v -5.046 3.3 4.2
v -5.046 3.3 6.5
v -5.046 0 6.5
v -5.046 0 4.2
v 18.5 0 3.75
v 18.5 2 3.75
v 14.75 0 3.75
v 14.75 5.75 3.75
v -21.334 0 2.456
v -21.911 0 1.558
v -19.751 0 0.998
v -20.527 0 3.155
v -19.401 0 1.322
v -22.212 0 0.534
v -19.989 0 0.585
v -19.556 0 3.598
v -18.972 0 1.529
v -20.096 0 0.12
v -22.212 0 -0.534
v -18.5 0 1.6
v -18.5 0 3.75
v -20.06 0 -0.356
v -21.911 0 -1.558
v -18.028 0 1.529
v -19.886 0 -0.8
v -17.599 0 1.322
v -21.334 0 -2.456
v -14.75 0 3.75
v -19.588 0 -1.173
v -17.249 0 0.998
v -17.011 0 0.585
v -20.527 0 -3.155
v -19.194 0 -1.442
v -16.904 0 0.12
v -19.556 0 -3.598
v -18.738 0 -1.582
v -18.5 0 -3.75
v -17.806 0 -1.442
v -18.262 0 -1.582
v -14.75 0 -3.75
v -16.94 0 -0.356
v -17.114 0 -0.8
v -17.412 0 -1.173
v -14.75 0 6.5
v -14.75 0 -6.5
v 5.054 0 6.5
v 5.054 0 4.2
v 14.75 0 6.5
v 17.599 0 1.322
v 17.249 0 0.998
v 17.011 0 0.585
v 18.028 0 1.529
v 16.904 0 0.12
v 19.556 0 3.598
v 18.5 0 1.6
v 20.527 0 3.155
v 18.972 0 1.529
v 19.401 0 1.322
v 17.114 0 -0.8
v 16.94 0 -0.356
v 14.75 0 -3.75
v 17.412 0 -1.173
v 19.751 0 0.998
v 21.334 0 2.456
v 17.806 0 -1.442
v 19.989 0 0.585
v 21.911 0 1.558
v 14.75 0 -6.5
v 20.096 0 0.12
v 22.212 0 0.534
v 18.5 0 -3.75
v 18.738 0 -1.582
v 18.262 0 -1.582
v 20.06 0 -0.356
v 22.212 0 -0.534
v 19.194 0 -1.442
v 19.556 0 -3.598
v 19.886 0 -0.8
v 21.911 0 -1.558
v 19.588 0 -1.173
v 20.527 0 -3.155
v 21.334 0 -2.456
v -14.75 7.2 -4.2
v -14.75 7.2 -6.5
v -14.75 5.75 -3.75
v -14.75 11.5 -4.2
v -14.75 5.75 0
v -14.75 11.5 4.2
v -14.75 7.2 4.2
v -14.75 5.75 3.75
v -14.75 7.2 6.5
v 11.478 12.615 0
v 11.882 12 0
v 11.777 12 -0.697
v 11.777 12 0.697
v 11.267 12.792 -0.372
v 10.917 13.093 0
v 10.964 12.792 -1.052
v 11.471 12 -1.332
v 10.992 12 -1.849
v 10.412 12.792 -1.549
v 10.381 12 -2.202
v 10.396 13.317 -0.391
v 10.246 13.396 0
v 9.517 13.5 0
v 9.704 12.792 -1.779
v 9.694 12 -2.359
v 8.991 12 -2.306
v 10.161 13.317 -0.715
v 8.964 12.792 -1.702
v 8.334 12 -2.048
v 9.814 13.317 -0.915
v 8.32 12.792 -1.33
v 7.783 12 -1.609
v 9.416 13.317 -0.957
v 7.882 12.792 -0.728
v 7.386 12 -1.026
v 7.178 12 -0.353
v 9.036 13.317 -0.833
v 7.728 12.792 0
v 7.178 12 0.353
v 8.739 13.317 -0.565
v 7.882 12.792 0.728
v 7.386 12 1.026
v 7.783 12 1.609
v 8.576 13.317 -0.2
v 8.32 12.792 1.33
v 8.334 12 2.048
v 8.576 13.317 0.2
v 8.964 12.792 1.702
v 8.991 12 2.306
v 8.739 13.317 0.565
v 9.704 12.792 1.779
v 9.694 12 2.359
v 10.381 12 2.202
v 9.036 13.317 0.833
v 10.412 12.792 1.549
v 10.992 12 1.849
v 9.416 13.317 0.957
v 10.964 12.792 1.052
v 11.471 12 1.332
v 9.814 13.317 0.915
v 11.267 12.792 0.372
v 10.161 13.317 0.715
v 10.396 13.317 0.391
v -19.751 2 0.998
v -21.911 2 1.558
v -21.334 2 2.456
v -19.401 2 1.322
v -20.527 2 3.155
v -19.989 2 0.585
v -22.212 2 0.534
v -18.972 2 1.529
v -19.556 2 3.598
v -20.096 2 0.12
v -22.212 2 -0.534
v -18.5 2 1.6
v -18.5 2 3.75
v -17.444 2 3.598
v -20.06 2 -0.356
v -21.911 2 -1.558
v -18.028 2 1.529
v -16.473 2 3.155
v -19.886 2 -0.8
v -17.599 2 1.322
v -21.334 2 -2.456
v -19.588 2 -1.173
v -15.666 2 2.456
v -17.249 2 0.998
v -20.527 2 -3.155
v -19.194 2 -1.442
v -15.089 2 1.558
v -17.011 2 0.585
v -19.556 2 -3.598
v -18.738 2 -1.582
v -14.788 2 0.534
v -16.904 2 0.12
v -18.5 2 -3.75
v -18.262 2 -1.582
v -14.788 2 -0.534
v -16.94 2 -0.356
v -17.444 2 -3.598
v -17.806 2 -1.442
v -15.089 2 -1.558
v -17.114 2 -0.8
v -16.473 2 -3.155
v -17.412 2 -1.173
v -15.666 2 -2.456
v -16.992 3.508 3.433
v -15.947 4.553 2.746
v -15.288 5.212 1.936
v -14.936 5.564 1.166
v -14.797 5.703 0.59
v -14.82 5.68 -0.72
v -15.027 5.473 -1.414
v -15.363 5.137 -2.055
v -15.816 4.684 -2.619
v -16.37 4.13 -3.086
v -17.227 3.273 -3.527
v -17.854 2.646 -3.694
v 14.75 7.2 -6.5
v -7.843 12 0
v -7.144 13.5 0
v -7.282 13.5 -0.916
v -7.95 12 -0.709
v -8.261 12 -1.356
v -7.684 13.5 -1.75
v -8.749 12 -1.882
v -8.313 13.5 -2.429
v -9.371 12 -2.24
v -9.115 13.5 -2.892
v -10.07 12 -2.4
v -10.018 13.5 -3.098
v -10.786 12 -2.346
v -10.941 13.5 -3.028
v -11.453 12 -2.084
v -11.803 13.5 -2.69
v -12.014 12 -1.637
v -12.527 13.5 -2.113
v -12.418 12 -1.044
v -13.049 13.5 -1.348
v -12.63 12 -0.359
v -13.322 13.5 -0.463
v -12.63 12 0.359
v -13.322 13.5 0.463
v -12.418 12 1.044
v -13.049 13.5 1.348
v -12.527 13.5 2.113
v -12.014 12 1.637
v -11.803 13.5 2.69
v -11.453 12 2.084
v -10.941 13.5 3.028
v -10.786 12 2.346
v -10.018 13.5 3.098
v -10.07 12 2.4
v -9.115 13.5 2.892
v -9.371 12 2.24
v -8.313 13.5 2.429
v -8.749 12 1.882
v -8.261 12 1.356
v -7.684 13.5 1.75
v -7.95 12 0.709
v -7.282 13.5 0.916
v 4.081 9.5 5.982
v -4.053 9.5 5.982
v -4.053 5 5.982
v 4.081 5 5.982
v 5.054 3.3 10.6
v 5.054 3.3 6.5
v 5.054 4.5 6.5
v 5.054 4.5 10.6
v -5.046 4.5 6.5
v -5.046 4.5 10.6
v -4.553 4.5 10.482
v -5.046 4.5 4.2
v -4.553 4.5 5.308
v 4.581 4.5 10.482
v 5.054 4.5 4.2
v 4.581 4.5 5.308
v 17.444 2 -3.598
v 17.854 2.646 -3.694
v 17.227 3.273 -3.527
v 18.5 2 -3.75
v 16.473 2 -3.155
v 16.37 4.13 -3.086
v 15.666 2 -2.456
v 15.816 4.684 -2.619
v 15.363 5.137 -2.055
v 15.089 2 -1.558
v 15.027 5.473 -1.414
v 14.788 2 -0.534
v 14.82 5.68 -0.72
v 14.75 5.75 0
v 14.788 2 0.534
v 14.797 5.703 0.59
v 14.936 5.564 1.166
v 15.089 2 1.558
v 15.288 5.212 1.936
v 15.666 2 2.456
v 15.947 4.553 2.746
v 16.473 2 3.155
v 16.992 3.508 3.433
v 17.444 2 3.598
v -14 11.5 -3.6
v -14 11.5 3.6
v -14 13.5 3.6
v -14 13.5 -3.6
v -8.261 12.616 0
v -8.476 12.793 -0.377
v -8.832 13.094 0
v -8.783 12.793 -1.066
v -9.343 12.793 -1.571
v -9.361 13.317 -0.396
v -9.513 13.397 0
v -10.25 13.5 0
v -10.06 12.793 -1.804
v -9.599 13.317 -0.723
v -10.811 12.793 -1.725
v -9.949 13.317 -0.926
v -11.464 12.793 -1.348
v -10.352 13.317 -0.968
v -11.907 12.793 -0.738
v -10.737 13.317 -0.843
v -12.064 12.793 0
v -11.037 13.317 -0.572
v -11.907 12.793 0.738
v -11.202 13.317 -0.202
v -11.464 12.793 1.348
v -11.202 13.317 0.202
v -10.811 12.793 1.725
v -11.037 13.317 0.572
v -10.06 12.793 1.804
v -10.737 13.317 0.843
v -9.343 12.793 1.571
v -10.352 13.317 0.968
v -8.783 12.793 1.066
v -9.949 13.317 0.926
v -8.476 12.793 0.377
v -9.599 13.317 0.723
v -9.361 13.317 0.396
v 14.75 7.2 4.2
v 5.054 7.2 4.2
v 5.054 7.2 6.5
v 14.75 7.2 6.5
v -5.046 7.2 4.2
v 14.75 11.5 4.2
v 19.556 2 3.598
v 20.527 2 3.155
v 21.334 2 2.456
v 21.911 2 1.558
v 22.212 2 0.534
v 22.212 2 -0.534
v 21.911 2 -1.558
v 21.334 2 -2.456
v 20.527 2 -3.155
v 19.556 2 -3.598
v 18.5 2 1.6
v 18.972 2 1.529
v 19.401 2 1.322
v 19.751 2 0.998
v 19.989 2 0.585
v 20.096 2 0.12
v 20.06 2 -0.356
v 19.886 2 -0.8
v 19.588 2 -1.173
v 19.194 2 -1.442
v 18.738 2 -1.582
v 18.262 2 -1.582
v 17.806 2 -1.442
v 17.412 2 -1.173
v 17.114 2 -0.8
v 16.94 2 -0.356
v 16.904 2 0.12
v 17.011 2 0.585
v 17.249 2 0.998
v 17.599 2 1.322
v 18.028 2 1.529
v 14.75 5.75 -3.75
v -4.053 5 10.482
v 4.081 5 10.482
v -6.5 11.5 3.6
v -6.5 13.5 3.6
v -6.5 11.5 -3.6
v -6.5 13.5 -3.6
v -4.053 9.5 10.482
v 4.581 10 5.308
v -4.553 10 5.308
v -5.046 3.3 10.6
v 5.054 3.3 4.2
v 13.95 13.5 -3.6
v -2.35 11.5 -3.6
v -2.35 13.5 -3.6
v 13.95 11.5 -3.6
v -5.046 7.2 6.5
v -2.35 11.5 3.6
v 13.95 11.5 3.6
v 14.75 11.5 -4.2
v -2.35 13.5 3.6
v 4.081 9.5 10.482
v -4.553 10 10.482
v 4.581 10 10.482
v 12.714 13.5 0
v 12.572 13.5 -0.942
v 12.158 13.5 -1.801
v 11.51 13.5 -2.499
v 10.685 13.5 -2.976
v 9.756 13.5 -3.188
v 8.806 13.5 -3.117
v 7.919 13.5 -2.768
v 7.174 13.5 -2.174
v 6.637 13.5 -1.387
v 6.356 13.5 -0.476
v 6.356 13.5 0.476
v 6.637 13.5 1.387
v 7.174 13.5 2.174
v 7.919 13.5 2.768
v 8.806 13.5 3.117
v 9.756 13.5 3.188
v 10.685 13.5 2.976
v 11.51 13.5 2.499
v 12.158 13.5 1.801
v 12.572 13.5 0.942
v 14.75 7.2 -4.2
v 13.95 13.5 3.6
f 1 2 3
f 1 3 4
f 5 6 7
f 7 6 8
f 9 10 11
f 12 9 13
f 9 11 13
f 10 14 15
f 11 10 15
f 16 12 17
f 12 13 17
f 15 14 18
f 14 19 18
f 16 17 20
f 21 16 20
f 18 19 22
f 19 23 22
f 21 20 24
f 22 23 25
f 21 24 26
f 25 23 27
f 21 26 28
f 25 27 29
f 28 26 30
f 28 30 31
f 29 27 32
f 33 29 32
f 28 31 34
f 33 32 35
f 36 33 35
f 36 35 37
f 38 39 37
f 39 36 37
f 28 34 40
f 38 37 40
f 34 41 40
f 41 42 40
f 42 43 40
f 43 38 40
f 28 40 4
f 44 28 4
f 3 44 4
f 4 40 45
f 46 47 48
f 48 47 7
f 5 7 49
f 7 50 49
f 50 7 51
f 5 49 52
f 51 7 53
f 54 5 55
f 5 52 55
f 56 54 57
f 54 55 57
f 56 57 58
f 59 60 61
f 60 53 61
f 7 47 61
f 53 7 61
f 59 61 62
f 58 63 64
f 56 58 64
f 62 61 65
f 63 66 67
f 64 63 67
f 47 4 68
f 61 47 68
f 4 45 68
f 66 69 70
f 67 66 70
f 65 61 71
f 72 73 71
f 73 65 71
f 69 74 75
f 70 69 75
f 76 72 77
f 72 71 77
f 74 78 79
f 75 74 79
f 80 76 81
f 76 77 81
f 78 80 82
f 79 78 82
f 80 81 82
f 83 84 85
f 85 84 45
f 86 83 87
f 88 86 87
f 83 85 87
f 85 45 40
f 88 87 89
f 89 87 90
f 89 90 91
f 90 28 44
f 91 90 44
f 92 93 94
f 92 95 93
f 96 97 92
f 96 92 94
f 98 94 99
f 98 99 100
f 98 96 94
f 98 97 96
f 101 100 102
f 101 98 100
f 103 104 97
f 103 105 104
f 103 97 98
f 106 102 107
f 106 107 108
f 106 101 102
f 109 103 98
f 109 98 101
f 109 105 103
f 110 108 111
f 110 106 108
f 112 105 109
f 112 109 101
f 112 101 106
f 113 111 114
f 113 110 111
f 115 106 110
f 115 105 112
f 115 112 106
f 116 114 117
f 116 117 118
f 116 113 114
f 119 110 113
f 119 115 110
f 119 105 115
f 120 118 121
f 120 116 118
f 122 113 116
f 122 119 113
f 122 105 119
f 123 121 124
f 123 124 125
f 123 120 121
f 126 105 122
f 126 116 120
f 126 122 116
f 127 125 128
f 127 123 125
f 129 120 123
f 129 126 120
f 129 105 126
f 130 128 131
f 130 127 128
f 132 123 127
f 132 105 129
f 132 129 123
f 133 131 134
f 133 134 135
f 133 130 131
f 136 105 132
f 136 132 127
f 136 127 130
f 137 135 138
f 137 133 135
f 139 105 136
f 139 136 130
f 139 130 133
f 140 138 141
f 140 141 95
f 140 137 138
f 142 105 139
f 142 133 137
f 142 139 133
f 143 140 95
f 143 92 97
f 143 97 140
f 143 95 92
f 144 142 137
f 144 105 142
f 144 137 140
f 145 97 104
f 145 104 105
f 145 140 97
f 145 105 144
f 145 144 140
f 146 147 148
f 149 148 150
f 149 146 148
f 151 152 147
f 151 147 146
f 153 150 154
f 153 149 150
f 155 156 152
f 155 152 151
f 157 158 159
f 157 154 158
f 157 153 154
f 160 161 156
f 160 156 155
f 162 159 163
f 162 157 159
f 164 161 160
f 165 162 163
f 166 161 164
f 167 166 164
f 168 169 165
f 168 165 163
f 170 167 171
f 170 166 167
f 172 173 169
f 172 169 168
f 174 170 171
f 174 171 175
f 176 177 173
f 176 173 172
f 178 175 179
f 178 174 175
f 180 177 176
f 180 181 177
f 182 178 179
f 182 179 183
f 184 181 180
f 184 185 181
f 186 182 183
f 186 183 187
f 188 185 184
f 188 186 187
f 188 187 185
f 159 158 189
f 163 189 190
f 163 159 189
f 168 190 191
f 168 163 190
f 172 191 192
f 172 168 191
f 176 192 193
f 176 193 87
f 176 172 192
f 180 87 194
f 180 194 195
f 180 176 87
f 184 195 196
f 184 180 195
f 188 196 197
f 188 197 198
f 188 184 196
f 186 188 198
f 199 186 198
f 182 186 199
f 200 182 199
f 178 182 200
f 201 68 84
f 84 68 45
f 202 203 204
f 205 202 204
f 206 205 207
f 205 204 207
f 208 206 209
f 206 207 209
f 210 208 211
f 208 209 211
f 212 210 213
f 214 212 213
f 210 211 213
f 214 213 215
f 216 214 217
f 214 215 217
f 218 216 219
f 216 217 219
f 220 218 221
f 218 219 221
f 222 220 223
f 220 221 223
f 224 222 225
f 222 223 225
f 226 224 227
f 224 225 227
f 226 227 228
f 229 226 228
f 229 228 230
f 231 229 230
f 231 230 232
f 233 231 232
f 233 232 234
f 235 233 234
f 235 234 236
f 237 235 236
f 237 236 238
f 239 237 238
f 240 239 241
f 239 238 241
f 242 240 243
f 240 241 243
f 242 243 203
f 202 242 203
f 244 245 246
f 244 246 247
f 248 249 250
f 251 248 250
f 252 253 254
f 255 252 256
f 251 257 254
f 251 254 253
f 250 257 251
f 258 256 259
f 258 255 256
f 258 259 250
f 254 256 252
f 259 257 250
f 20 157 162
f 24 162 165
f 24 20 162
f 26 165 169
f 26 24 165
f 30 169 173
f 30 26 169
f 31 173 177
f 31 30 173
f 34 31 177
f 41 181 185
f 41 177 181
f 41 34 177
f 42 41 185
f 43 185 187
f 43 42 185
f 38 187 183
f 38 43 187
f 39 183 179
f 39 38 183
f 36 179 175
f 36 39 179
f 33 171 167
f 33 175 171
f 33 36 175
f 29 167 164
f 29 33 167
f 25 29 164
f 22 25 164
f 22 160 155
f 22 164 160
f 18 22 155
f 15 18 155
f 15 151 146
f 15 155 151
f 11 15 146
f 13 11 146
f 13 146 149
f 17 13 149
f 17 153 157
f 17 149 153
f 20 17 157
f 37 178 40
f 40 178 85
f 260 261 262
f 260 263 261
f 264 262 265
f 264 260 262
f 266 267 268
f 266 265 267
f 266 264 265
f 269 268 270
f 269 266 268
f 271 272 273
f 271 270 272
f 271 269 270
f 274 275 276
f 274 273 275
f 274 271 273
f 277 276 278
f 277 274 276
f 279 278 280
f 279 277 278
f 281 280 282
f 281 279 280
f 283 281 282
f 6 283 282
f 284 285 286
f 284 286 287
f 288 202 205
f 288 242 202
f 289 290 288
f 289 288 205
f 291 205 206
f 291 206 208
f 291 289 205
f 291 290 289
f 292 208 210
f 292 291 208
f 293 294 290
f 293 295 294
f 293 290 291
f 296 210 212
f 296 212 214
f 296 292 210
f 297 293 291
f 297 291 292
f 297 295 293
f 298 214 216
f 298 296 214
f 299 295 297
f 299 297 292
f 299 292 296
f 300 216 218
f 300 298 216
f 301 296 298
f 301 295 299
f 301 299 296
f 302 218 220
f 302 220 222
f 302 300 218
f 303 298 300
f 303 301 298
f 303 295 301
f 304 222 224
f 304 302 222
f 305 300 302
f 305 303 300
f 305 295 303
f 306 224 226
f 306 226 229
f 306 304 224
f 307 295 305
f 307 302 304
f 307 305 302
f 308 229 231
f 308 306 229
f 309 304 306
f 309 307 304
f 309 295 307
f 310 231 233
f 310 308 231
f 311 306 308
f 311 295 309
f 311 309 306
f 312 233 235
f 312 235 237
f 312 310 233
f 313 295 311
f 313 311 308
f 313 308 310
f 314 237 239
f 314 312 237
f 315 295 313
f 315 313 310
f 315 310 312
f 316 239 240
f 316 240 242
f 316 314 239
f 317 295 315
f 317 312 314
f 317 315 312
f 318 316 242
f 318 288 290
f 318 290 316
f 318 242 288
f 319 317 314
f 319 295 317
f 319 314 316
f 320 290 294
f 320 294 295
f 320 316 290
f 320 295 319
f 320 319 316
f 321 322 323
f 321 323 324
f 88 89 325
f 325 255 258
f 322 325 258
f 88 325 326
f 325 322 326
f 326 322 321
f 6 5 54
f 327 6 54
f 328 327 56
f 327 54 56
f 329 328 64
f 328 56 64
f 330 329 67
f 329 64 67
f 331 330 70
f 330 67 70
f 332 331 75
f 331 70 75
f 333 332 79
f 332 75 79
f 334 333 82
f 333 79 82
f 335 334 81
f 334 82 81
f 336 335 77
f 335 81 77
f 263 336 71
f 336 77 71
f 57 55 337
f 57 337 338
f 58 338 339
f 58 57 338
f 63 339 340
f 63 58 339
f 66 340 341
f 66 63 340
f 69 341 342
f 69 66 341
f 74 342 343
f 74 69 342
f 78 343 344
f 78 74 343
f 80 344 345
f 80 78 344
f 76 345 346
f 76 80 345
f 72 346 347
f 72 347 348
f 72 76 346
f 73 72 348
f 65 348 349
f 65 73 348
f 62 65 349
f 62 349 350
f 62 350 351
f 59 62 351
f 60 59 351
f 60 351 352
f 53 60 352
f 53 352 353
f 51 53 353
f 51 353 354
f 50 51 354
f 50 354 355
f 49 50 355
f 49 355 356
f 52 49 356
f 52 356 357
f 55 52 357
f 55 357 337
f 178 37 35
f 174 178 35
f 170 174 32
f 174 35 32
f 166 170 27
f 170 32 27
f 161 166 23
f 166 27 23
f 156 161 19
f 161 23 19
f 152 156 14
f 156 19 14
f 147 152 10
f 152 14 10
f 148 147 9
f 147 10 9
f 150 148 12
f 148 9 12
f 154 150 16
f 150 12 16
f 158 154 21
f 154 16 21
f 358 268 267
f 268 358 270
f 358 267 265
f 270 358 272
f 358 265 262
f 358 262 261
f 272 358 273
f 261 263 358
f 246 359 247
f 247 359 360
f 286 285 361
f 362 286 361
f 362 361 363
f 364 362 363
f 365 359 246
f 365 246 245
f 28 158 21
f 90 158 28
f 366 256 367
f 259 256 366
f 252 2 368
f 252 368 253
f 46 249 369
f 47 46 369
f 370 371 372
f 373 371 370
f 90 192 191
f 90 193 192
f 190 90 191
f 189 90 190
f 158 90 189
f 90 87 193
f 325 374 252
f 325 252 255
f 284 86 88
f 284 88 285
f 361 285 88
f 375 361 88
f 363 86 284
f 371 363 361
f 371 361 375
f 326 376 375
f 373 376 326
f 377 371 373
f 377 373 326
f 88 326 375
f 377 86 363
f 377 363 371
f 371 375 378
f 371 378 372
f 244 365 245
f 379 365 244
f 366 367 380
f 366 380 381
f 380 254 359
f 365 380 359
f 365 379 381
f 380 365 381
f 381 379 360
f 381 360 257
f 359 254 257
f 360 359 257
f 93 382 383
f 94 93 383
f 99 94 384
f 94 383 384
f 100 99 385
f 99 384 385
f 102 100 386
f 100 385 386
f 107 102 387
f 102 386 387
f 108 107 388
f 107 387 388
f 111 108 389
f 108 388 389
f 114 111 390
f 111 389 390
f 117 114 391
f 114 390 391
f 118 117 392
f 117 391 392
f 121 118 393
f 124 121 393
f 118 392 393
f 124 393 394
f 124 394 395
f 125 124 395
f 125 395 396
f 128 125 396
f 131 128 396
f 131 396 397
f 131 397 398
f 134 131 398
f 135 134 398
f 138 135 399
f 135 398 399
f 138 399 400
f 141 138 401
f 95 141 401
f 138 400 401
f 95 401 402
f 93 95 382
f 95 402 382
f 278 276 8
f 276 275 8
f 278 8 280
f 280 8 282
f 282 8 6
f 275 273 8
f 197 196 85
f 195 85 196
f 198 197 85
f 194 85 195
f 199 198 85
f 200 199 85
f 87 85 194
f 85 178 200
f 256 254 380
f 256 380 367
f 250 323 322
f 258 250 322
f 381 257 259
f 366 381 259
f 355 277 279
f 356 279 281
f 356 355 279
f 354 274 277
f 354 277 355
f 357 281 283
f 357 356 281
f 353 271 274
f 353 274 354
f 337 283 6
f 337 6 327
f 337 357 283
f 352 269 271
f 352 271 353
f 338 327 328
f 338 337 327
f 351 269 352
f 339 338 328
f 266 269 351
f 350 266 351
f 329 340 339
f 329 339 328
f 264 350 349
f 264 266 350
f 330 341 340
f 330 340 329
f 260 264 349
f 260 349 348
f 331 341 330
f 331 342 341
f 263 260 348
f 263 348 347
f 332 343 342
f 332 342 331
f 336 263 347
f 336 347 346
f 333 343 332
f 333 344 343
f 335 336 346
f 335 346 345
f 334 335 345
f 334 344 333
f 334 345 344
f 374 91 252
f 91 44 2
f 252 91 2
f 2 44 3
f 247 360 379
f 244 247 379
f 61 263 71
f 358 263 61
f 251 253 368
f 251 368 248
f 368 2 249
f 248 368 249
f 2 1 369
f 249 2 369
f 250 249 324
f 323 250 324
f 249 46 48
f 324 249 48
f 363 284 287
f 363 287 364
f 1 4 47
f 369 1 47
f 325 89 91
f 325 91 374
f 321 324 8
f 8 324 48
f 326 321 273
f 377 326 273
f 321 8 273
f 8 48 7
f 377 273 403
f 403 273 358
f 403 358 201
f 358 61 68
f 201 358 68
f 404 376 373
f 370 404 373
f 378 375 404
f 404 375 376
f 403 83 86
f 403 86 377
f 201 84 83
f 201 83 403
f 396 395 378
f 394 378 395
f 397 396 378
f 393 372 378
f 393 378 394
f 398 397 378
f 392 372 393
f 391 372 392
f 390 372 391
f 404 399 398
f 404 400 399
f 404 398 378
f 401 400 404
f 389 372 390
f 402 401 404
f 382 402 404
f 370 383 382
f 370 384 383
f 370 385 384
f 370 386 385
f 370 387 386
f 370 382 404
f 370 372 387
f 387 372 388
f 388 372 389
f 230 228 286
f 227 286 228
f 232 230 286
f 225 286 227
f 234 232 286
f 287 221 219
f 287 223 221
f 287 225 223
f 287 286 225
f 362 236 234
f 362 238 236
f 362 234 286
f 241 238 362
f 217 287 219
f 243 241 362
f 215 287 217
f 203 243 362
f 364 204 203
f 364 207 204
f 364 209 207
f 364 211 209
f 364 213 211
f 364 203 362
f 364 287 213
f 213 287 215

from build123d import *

# Parameters (mm, degrees)
BOSS_EXTRUDE1_DEPTH   = 7.2
SKETCH1_3_R           = 3.75
SKETCH1_3_R_2         = 1.6
BOSS_EXTRUDE2_DEPTH   = 2
BOSS_EXTRUDE2_2_DEPTH = 2
BOSS_EXTRUDE3_DEPTH   = 2
BOSS_EXTRUDE4_DEPTH   = 7.5
SKETCH3_R             = 3.75
CUT_EXTRUDE6_DEPTH    = 12
BOSS_EXTRUDE5_DEPTH   = 7.5
SKETCH5_R             = 3.75
CUT_EXTRUDE7_DEPTH    = 7.5
SKETCH6_W             = 29.5
SKETCH6_H             = 8.4
BOSS_EXTRUDE6_DEPTH   = 4.3
SKETCH7_W             = 7.5
SKETCH7_H             = 7.2
SKETCH7_W_2           = 16.3
BOSS_EXTRUDE7_DEPTH   = 2
SKETCH8_W             = 10.1
SKETCH8_H             = 2.3
CUT_EXTRUDE8_DEPTH    = 12
SKETCH9_W             = 10.1
SKETCH9_H             = 1.2
BOSS_EXTRUDE8_DEPTH   = 6.4
SKETCH11_W            = 9.1347476
SKETCH11_H            = 5.173710516
BOSS_EXTRUDE11_DEPTH  = 5.5
SKETCH12_R            = 3.106234899
CUT_EXTRUDE10_DEPTH   = 1.5
CUT_EXTRUDE10_DRAFT   = -25
SKETCH13_R            = 3.196774454
CUT_EXTRUDE11_DEPTH   = 1.5
CUT_EXTRUDE11_DRAFT   = -29
SKETCH14_W            = 8.1347476
SKETCH14_H            = 4.5
CUT_EXTRUDE12_DEPTH   = 4.5


# Read off the part's stored shape, not the designer's step: Dome1, Dome2
with BuildPart() as part:
    # Sketch1 → Boss-Extrude1 (new body)
    with BuildSketch(Plane(origin=(0, 0, 0), x_dir=(1, 0, 0), z_dir=(0, 1, 0))):
        Polygon((14.75, 0), (-14.75, 0), (-14.75, -3.75), (-14.75, -6.5), (14.75, -6.5), (14.75, -3.75), align=None)
        Polygon((-14.75, 3.75), (-14.75, 0), (14.75, 0), (14.75, 3.75), (14.75, 6.5), (-14.75, 6.5), align=None)
    extrude(amount=BOSS_EXTRUDE1_DEPTH)



with BuildPart() as body_2:
    # Sketch1<3> → Boss-Extrude2 (new body)
    with BuildSketch(Plane(origin=(0, 0, 0), x_dir=(1, 0, 0), z_dir=(0, 1, 0))):
        with Locations(Location((-18.5, 0, 0), (0, 0, 270))):
            Circle(SKETCH1_3_R)
        with Locations(Location((-18.5, 0, 0), (0, 0, 270))):
            Circle(SKETCH1_3_R_2, mode=Mode.SUBTRACT)
    extrude(amount=BOSS_EXTRUDE2_DEPTH)


with BuildPart() as body_3:
    # Sketch1<3> → Boss-Extrude2 2 (new body)
    with BuildSketch(Plane(origin=(0, 0, 0), x_dir=(1, 0, 0), z_dir=(0, 1, 0))):
        with Locations(Location((18.5, 0, 0), (0, 0, 270))):
            Circle(SKETCH1_3_R)
        with Locations(Location((18.5, 0, 0), (0, 0, 270))):
            Circle(SKETCH1_3_R_2, mode=Mode.SUBTRACT)
    extrude(amount=BOSS_EXTRUDE2_2_DEPTH)


with BuildPart() as part_1:
    add(part.part)

    add(body_2.part)  # Boss-Extrude3 merges body 2

    add(body_3.part)  # Boss-Extrude3 merges body 3
    # Sketch1<4> → Boss-Extrude3 (add)
    with BuildSketch(Plane(origin=(0, 0, 0), x_dir=(1, 0, 0), z_dir=(0, 1, 0))):
        with BuildLine():
            Line((-14.75, -3.75), (-14.75, 0))
            ThreePointArc((-14.75, 0), (-15.848349571, -2.651650429), (-18.5, -3.75))
            Line((-18.5, -3.75), (-14.75, -3.75))
        make_face()
        with BuildLine():
            Line((-14.75, 0), (-14.75, 3.75))
            Line((-14.75, 3.75), (-18.5, 3.75))
            ThreePointArc((-18.5, 3.75), (-15.848349571, 2.651650429), (-14.75, 0))
        make_face()
        with BuildLine():
            Line((18.5, 3.75), (14.75, 3.75))
            Line((14.75, 3.75), (14.75, 0))
            ThreePointArc((14.75, 0), (15.848349571, 2.651650429), (18.5, 3.75))
        make_face()
        with BuildLine():
            ThreePointArc((18.5, -3.75), (15.848349571, -2.651650429), (14.75, 0))
            Line((14.75, 0), (14.75, -3.75))
            Line((14.75, -3.75), (18.5, -3.75))
        make_face()
    extrude(amount=BOSS_EXTRUDE3_DEPTH)

    # Sketch2 → Boss-Extrude4 (add)
    with BuildSketch(Plane.XY.offset(3.75)):
        Polygon((18.5, 2), (14.75, 2), (14.75, 5.75), align=None)
    extrude(amount=-BOSS_EXTRUDE4_DEPTH)

    # Sketch3 → Cut-Extrude6 (cut)
    with BuildSketch(Plane(origin=(0, 2, 0), x_dir=(1, 0, 0), z_dir=(0, 1, 0))):
        with Locations((18.5, 0)):
            Circle(SKETCH3_R)
    extrude(amount=CUT_EXTRUDE6_DEPTH, mode=Mode.SUBTRACT)

    # Sketch4 → Boss-Extrude5 (add)
    with BuildSketch(Plane.XY.offset(3.75)):
        Polygon((-14.75, 5.75), (-18.5, 2), (-14.75, 2), align=None)
    extrude(amount=-BOSS_EXTRUDE5_DEPTH)

    # Sketch5 → Cut-Extrude7 (cut)
    with BuildSketch(Plane(origin=(0, 2, 0), x_dir=(1, 0, 0), z_dir=(0, 1, 0))):
        with Locations((-18.5, 0)):
            Circle(SKETCH5_R)
    extrude(amount=CUT_EXTRUDE7_DEPTH, mode=Mode.SUBTRACT)

    # Sketch6 → Boss-Extrude6 (add)
    with BuildSketch(Plane(origin=(0, 7.2, 0), x_dir=(1, 0, 0), z_dir=(0, 1, 0))):
        Rectangle(SKETCH6_W, SKETCH6_H)
    extrude(amount=BOSS_EXTRUDE6_DEPTH)

    # Sketch7 → Boss-Extrude7 (add)
    with BuildSketch(Plane(origin=(0, 11.5, 0), x_dir=(1, 0, 0), z_dir=(0, 1, 0))):
        with Locations((-10.25, 0)):
            Rectangle(SKETCH7_W, SKETCH7_H)
        with Locations((5.8, 0)):
            Rectangle(SKETCH7_W_2, SKETCH7_H)
    extrude(amount=BOSS_EXTRUDE7_DEPTH)

    # Sketch8 → Cut-Extrude8 (cut)
    with BuildSketch(Plane(origin=(0, 7.2, 0), x_dir=(1, 0, 0), z_dir=(0, 1, 0))):
        with Locations((0.003829246, -5.35)):
            Rectangle(SKETCH8_W, SKETCH8_H)
    extrude(amount=-CUT_EXTRUDE8_DEPTH, mode=Mode.SUBTRACT)

    # Sketch9 → Boss-Extrude8 (add)
    with BuildSketch(Plane.XY.offset(4.2)):
        with Locations((0.003829246, 3.9)):
            Rectangle(SKETCH9_W, SKETCH9_H)
    extrude(amount=BOSS_EXTRUDE8_DEPTH)

    # Sketch11 → Boss-Extrude11 (add)
    with BuildSketch(Plane(origin=(0, 4.5, 0), x_dir=(1, 0, 0), z_dir=(0, 1, 0))):
        with Locations((0.014014126, -7.894862881)):
            Rectangle(SKETCH11_W, SKETCH11_H)
    extrude(amount=BOSS_EXTRUDE11_DEPTH)


with BuildPart() as cut_extrude10_tool:
    # Sketch12 → Cut-Extrude10 (with draft: the straight prism first)
    with BuildSketch(Plane(origin=(0, 13.5, 0), x_dir=(1, 0, 0), z_dir=(0, 1, 0))):
        with Locations((-10.25, 0)):
            Circle(SKETCH12_R)
    extrude(amount=-CUT_EXTRUDE10_DEPTH)
    # Cut-Extrude10: the draft: its side faces are tilted about the plane it starts from
    cut_extrude10_sides = [cut_extrude10_tool.faces().sort_by_distance(p)[0] for p in [
        (-13.356234899, 12.75, 0),
    ]]
    draft(cut_extrude10_sides, Plane(origin=(0, 13.5, 0), x_dir=(1, 0, 0), z_dir=(0, 1, 0)), CUT_EXTRUDE10_DRAFT)


with BuildPart() as part_2:
    add(part_1.part)

    # Cut-Extrude10: cut by cut_extrude10_tool
    add(cut_extrude10_tool.part, mode=Mode.SUBTRACT)


with BuildPart() as cut_extrude11_tool:
    # Sketch13 → Cut-Extrude11 (with draft: the straight prism first)
    with BuildSketch(Plane(origin=(0, 13.5, 0), x_dir=(1, 0, 0), z_dir=(0, 1, 0))):
        with Locations((9.516994158, 0)):
            Circle(SKETCH13_R)
    extrude(amount=-CUT_EXTRUDE11_DEPTH)
    # Cut-Extrude11: the draft: its side faces are tilted about the plane it starts from
    cut_extrude11_sides = [cut_extrude11_tool.faces().sort_by_distance(p)[0] for p in [
        (6.320219704, 12.75, 0),
    ]]
    draft(cut_extrude11_sides, Plane(origin=(0, 13.5, 0), x_dir=(1, 0, 0), z_dir=(0, 1, 0)), CUT_EXTRUDE11_DRAFT)


with BuildPart() as part_3:
    add(part_2.part)

    # Cut-Extrude11: cut by cut_extrude11_tool
    add(cut_extrude11_tool.part, mode=Mode.SUBTRACT)

    # Dome1 outline → Dome1 (revolve)
    with BuildSketch(Plane(origin=(-10.25, 0, 0), x_dir=(1, 0, 0), z_dir=(0, 0, 1))):
        with BuildLine():
            Line((0, 12), (2.406773413, 11.999999998))
            ThreePointArc((2.406773413, 11.999999998), (1.417970228, 13.094302608), (0, 13.5))
            Line((0, 13.5), (0, 12))
        make_face()
    revolve(axis=Axis((-10.25, 0, 0), (0, 1, 0)))

    # Dome2 outline → Dome2 (revolve)
    with BuildSketch(Plane(origin=(9.516994158, 0, 0), x_dir=(1, 0, 0), z_dir=(0, 0, 1))):
        with BuildLine():
            Line((0, 12), (2.365310878, 11.999999998))
            ThreePointArc((2.365310878, 11.999999998), (1.400419183, 13.093385967), (0, 13.5))
            Line((0, 13.5), (0, 12))
        make_face()
    revolve(axis=Axis((9.516994158, 0, 0), (0, 1, 0)))

    # Sketch14 → Cut-Extrude12 (cut)
    with BuildSketch(Plane.XY.offset(10.481718139)):
        with Locations((0.014014126, 7.25)):
            Rectangle(SKETCH14_W, SKETCH14_H)
    extrude(amount=-CUT_EXTRUDE12_DEPTH, mode=Mode.SUBTRACT)


solid = part_3.part
